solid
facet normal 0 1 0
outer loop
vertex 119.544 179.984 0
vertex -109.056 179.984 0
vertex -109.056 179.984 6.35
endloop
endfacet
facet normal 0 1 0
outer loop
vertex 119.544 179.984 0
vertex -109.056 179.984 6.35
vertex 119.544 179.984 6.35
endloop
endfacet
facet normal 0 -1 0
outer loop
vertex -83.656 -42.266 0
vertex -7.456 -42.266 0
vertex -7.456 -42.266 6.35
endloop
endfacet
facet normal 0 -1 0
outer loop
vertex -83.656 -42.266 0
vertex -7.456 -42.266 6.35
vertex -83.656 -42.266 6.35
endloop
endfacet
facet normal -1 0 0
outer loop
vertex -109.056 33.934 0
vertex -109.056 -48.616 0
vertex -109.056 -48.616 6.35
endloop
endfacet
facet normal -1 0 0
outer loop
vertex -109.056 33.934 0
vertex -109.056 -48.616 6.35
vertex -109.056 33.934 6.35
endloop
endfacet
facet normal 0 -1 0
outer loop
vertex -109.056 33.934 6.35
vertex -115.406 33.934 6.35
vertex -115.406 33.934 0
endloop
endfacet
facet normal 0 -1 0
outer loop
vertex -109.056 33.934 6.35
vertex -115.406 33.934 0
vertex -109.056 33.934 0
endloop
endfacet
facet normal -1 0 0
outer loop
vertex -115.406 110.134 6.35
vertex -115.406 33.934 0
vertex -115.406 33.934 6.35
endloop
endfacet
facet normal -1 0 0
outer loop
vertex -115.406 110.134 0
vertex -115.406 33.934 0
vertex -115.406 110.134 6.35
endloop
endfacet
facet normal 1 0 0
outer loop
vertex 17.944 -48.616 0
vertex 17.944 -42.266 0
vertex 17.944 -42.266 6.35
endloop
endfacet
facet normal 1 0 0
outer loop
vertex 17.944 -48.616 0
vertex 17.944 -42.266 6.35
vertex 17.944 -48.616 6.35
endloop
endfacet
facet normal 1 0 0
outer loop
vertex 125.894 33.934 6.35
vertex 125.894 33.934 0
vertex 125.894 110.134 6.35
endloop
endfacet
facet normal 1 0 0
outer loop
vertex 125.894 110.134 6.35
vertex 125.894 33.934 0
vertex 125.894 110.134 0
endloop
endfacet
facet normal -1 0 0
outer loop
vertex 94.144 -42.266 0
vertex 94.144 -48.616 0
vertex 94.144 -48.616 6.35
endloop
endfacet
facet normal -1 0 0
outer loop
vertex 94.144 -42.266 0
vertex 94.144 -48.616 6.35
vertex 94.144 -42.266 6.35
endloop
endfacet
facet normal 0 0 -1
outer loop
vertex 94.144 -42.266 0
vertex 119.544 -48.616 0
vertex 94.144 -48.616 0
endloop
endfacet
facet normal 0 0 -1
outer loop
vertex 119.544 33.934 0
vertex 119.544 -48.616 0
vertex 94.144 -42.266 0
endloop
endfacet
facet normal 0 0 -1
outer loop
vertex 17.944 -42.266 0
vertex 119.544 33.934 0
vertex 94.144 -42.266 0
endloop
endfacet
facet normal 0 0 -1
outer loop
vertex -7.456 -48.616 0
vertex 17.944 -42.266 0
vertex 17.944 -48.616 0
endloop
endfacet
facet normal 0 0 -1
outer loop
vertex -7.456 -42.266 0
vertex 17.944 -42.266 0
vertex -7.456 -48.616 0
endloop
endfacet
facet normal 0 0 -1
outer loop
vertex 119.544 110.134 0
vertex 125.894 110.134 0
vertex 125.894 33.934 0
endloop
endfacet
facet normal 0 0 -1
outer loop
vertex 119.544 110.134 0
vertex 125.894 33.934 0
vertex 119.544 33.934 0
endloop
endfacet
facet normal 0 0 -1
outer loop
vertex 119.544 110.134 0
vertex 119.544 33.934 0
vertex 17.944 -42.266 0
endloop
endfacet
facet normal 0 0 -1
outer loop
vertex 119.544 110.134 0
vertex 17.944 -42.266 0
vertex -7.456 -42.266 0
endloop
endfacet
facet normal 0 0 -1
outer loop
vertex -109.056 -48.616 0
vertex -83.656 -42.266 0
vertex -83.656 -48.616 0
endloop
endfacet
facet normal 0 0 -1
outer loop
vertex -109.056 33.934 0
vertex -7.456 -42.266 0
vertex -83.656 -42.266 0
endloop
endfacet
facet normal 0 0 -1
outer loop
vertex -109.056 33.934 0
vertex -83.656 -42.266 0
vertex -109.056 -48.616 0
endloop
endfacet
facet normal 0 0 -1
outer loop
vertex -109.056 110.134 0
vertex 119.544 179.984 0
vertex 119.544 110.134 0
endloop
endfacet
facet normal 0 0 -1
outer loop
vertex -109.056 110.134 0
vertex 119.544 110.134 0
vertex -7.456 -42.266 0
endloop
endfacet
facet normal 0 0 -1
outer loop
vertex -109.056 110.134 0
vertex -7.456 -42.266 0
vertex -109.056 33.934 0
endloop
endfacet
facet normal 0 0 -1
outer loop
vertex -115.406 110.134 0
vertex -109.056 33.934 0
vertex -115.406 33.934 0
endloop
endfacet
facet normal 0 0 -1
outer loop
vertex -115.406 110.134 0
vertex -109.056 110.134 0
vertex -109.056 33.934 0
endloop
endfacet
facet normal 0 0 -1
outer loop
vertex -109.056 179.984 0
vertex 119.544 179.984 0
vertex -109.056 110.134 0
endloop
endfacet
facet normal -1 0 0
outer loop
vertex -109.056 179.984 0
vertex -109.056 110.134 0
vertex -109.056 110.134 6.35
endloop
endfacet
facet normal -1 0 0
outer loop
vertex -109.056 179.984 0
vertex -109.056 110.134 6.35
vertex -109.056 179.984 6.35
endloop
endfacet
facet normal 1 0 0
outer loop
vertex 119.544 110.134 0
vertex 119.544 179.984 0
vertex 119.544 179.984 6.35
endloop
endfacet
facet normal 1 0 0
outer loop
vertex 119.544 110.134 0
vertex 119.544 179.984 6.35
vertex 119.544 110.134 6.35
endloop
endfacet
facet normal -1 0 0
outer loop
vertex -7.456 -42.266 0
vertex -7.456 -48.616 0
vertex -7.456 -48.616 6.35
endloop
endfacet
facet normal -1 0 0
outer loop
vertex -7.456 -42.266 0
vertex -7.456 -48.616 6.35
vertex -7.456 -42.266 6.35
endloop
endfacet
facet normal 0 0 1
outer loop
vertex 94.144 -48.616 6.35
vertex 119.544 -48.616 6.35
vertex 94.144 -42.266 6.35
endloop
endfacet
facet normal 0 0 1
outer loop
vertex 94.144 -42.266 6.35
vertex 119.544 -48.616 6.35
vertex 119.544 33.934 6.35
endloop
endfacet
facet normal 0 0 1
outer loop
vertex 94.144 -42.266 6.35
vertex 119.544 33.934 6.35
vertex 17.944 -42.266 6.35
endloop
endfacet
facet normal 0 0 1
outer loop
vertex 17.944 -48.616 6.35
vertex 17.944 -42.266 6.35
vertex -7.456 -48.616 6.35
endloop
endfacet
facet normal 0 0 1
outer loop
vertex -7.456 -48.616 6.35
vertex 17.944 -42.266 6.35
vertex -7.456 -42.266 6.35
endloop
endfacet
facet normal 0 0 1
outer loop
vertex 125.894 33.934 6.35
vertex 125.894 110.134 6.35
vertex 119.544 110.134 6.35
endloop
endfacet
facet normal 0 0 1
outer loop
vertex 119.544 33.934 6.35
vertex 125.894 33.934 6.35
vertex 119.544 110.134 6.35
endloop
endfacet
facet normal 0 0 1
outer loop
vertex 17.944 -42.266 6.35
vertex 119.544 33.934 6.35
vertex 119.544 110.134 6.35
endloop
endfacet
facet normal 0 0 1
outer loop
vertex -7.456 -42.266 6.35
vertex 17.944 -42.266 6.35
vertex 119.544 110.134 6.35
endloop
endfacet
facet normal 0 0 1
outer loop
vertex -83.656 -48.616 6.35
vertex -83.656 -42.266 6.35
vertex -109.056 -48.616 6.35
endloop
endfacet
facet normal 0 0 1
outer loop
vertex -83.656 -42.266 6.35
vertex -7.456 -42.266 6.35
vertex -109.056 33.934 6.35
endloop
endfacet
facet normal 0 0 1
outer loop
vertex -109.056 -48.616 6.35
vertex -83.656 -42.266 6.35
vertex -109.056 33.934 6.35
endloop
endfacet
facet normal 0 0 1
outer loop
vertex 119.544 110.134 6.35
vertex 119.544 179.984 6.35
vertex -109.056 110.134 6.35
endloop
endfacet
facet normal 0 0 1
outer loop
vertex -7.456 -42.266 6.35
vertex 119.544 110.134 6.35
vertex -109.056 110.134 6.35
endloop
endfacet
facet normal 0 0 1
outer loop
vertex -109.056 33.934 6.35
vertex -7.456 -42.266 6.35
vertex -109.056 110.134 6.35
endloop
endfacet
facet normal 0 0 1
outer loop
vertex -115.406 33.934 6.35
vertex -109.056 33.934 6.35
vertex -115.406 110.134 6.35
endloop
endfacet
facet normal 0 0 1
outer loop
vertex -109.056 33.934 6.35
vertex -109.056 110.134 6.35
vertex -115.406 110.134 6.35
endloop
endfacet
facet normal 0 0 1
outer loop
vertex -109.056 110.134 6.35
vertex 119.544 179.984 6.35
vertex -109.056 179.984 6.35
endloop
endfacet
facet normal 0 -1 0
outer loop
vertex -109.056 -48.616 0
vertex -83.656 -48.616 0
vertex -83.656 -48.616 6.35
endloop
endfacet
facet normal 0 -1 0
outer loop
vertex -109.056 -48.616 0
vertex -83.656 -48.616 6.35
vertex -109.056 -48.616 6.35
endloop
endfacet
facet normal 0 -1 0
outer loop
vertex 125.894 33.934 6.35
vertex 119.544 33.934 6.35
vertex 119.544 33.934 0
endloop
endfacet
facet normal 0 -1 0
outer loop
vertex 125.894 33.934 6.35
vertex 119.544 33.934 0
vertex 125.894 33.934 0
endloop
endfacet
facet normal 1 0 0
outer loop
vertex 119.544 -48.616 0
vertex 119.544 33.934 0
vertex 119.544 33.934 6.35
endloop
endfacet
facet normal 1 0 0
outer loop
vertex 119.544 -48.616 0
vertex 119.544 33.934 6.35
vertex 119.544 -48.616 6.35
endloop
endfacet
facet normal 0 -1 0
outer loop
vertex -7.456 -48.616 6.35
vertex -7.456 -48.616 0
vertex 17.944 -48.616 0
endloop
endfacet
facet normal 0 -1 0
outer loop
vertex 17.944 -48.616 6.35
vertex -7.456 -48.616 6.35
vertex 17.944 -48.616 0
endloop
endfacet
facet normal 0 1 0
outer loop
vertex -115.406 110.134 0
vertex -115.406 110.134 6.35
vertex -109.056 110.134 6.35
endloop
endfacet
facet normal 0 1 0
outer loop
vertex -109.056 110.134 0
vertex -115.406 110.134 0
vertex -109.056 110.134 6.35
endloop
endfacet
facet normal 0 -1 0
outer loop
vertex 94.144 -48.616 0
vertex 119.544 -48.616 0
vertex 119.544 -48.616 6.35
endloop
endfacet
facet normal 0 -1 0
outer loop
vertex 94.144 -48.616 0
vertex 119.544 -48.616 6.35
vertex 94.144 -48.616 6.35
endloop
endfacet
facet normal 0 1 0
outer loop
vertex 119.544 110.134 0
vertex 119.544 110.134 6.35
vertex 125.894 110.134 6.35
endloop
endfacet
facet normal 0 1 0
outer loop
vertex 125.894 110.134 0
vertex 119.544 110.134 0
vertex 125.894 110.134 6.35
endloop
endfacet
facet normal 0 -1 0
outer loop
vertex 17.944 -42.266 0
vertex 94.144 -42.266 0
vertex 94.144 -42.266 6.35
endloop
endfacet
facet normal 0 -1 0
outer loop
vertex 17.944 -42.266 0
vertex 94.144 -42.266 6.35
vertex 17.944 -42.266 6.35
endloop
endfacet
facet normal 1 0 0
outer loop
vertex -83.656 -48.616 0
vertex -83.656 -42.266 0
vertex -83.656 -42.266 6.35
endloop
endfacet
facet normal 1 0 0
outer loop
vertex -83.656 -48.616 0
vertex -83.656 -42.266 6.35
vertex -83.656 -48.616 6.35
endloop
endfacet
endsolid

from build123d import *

# Parameters (mm, degrees)
SKETCH1_W           = 6.35
SKETCH1_H           = 76.2
BOSS_EXTRUDE1_DEPTH = 6.35


with BuildPart() as part:
    # Sketch1 → Boss-Extrude1 (new body)
    with BuildSketch(Plane.XY):
        Polygon((119.544333082, -48.615768355), (94.144333082, -48.615768355), (94.144333082, -42.265768355), (17.944333082, -42.265768355), (17.944333082, -48.615768355), (5.244333082, -48.615768355), (-7.455666918, -48.615768355), (-7.455666918, -42.265768355), (-83.655666918, -42.265768355), (-83.655666918, -48.615768355), (-109.055666918, -48.615768355), (-109.055666918, 179.984231645), (119.544333082, 179.984231645), align=None)
        with Locations((-112.230666918, 72.034231645)):
            Rectangle(SKETCH1_W, SKETCH1_H)
        with Locations((122.719333082, 72.034231645)):
            Rectangle(SKETCH1_W, SKETCH1_H)
    extrude(amount=BOSS_EXTRUDE1_DEPTH)


solid = part.part
